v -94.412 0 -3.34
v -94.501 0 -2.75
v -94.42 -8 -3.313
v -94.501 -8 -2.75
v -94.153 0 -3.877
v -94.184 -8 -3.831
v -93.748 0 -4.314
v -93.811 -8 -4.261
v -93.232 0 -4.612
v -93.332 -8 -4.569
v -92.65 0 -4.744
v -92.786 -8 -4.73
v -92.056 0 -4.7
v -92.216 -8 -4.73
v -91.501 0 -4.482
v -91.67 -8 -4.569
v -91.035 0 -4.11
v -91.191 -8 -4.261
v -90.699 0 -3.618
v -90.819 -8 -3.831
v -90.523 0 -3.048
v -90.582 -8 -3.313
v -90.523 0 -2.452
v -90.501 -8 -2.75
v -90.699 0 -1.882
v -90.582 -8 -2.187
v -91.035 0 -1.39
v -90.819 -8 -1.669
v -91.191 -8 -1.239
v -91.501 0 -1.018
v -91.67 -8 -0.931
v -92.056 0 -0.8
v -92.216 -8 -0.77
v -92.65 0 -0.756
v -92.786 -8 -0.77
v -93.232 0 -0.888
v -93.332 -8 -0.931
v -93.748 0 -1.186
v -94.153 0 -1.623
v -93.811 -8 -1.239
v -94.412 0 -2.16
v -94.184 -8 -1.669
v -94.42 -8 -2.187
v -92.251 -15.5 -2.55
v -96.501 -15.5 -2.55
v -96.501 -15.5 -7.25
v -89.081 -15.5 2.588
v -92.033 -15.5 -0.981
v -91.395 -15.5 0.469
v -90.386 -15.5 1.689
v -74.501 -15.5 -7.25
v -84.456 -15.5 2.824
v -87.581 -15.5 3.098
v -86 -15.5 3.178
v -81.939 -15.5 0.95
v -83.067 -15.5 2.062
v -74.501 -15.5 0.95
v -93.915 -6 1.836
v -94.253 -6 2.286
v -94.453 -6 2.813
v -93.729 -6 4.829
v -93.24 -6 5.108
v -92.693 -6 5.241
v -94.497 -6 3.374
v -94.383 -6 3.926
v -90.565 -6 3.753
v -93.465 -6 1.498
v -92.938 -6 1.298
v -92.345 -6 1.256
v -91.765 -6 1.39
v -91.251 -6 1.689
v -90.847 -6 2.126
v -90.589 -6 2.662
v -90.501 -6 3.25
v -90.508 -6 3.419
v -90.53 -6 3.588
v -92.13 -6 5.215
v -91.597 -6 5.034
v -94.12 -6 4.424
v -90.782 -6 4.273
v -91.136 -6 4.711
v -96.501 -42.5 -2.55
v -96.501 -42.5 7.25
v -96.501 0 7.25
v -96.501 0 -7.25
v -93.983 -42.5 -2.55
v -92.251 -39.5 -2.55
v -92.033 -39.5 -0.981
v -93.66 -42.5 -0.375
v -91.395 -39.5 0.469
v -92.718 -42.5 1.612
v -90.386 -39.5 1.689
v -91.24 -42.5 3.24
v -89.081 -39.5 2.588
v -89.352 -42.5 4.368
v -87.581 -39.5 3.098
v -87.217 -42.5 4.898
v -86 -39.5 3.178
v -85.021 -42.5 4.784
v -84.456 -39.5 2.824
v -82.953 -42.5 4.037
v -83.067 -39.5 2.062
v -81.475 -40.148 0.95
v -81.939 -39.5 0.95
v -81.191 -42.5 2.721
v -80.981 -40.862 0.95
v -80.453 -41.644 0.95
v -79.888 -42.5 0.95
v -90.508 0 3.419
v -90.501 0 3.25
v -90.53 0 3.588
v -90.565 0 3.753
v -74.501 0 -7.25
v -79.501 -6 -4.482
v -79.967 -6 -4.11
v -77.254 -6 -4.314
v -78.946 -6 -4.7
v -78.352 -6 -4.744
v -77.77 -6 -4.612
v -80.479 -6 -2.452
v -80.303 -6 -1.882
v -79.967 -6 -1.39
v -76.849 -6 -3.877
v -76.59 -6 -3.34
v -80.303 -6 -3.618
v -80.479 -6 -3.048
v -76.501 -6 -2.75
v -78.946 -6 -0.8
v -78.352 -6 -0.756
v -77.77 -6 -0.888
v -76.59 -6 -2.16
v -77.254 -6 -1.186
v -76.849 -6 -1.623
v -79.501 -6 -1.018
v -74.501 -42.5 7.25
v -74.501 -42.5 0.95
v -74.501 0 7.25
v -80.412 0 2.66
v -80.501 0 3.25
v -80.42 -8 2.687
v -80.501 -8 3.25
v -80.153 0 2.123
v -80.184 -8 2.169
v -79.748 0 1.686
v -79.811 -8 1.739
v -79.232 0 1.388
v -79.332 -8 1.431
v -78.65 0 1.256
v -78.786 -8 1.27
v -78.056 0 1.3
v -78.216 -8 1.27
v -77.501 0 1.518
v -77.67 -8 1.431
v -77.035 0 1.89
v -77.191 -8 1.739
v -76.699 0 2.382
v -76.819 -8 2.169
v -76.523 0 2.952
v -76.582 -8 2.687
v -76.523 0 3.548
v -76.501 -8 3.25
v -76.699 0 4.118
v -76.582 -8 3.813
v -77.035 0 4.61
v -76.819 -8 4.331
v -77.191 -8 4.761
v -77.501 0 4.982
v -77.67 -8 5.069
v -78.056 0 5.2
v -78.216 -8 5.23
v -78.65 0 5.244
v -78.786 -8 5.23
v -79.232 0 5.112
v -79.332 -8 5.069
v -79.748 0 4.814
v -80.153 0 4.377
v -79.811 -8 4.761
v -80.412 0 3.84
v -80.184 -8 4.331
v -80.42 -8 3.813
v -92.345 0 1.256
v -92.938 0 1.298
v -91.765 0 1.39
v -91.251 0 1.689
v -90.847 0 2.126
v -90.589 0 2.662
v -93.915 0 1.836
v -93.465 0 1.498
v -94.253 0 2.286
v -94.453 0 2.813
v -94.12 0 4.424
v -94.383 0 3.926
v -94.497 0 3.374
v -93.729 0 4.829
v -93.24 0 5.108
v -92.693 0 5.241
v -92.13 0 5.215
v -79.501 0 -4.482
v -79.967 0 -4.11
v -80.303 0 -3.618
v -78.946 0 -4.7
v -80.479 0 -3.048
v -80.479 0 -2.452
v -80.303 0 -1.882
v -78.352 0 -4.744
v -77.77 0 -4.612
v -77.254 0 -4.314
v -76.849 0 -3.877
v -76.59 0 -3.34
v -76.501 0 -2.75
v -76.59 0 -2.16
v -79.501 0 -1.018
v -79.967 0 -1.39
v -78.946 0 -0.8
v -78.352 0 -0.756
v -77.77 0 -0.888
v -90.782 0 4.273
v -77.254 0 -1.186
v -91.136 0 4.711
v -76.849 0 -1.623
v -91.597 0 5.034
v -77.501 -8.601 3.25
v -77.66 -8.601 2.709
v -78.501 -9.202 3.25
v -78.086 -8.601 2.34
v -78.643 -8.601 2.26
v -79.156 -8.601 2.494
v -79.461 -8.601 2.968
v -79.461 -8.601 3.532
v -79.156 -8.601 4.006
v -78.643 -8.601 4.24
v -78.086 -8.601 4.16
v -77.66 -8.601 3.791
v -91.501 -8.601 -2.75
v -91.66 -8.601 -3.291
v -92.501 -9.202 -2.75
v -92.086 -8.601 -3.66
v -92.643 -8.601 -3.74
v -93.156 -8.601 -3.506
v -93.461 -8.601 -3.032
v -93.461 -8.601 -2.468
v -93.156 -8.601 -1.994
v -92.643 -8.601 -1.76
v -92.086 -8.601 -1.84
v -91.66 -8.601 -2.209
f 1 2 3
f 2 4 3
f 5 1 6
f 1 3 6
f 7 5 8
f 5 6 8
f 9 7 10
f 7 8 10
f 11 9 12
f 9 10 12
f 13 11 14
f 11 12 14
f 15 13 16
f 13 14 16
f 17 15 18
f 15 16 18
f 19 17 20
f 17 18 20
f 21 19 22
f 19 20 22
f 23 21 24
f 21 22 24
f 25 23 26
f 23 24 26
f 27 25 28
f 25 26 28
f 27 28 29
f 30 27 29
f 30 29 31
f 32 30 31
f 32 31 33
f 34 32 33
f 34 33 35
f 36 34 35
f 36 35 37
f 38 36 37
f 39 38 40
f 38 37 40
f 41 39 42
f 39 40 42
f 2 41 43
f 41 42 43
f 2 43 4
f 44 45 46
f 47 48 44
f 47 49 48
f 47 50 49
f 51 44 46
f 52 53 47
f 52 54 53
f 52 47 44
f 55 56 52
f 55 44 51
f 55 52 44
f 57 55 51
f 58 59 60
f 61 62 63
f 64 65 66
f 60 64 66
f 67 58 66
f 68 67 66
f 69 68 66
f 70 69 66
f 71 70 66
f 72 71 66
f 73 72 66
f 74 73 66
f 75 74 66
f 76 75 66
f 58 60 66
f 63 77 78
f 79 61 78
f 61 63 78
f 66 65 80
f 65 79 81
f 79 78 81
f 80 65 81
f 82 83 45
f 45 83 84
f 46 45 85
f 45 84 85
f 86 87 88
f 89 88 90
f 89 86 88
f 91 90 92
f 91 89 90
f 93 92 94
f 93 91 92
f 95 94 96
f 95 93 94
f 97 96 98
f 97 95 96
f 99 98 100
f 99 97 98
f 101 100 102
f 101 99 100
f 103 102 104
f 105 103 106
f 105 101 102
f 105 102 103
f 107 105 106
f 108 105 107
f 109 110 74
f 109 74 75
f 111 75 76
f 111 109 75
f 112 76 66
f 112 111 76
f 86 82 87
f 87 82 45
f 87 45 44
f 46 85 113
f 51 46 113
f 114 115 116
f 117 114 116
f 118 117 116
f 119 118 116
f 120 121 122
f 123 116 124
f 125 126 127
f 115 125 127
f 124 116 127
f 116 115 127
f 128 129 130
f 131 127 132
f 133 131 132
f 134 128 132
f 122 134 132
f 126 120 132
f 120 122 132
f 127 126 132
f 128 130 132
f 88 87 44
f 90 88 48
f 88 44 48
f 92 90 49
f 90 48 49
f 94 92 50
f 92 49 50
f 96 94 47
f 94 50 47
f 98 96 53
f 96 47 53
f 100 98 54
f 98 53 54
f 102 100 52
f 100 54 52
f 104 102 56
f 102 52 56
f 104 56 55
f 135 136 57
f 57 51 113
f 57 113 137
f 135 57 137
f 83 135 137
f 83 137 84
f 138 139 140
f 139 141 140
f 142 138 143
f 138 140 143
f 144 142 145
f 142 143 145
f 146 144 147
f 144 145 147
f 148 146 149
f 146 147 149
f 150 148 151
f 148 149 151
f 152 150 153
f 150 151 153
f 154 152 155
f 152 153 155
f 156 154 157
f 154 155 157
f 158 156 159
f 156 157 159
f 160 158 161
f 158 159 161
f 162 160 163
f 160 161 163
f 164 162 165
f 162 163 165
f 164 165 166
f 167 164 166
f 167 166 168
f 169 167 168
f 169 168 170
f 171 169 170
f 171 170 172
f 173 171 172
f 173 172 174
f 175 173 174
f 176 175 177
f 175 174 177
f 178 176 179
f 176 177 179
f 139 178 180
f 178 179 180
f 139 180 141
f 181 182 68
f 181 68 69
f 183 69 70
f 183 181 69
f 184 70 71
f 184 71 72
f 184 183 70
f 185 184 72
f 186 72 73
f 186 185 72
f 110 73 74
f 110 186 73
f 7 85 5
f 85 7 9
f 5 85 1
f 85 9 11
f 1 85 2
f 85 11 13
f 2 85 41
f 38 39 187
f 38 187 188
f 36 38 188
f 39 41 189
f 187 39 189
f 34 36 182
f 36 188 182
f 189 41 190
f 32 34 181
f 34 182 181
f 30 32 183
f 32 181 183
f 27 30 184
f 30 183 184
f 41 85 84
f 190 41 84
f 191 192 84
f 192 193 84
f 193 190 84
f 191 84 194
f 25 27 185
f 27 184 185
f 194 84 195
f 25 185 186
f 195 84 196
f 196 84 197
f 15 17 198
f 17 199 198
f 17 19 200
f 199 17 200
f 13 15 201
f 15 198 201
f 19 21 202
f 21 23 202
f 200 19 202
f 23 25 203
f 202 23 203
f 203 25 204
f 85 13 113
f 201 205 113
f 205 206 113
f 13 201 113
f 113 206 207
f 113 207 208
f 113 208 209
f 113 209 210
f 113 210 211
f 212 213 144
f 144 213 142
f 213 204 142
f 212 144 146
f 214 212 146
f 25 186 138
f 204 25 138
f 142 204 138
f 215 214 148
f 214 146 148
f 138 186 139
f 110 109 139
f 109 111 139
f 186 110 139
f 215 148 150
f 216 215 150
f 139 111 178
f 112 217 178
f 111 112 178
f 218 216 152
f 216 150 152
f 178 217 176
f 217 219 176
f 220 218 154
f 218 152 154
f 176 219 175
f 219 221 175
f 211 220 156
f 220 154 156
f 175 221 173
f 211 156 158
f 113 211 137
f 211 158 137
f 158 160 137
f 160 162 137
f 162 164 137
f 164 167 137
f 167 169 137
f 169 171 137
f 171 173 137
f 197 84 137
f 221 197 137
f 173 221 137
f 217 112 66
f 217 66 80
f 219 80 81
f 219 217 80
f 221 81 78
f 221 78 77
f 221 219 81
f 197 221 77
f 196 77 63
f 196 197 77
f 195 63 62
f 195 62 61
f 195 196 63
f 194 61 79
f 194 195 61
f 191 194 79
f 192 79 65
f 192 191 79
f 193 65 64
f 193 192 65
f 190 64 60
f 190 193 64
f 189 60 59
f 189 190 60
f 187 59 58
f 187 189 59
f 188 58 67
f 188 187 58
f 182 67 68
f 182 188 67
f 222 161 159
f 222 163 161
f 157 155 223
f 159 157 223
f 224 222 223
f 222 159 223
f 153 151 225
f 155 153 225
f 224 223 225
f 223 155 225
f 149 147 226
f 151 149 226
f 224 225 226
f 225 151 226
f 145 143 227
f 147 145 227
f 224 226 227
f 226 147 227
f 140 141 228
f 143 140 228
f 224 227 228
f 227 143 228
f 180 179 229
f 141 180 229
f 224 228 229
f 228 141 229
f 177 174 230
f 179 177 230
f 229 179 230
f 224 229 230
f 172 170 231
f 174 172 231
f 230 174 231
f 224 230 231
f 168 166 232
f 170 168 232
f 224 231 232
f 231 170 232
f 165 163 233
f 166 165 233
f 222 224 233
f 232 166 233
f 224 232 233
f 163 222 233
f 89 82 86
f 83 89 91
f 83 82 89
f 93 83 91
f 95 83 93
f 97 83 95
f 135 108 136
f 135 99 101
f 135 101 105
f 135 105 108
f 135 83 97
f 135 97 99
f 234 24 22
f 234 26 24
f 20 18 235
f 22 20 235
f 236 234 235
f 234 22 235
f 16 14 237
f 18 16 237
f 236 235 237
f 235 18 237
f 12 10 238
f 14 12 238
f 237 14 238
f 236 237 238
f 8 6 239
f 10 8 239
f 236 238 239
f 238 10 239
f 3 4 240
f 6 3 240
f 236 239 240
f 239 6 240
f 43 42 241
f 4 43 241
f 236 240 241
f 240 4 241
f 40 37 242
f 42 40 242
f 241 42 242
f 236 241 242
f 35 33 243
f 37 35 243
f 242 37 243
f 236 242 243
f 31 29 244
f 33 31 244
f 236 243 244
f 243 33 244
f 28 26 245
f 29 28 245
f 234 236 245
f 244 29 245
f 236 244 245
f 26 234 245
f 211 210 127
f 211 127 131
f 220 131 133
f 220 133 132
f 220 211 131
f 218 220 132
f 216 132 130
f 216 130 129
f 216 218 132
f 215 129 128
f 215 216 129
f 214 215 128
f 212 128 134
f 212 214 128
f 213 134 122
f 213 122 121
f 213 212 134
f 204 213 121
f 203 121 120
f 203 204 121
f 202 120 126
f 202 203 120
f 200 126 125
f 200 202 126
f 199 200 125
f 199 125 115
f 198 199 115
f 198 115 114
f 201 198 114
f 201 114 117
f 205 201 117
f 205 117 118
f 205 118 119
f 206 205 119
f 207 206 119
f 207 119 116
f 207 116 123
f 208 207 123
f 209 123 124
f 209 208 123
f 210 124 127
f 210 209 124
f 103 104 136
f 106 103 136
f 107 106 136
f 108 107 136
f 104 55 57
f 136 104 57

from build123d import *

# Parameters (mm, degrees)
F0_R     = 1.62
F0_R_2   = 2
F1_DEPTH = 15.5
F3_DEPTH = 27
F4_D     = 4
F4_DEPTH = 8
F4_TIP   = 1.2017212381
F5_DEPTH = 6
F6_SIZE2 = 1.7320508076
F6_SIZE  = 3


# Not quite as in the source:
# - ends of sketch curves that miss each other by under 0.0002 mm in the source are joined


with BuildPart() as f1:
    # F0 (on Front) → F1 (new body)
    with BuildSketch(Plane.XZ):
        with BuildLine():
            Line((-81.938941, 0.95), (-79.867763328, 0.95))
            ThreePointArc((-79.867763328, 0.95), (-84.599863166, 4.7050416476), (-90.5653650686, 3.7532564808))
            ThreePointArc((-90.5653650686, 3.7532564808), (-90.517166249, 3.503677095), (-90.501013, 3.25))
            ThreePointArc((-90.501013, 3.25), (-91.2509614327, 1.6887917887), (-92.9383840791, 1.2984092286))
            ThreePointArc((-92.9383840791, 1.2984092286), (-93.5417590804, 0.0341622689), (-93.899505073, -1.3202378094))
            ThreePointArc((-93.899505073, -1.3202378094), (-93.0082544766, -0.8153925244), (-91.9839548989, -0.8179930331))
            ThreePointArc((-91.9839548989, -0.8179930331), (-87.4977327048, 3.112954161), (-81.938941, 0.95))
        make_face()
        with BuildLine():
            ThreePointArc((-90.5653650686, 3.7532564808), (-84.599863166, 4.7050416476), (-79.867763328, 0.9499998269))
            Line((-79.867763328, 0.9499998269), (-74.501013, 0.95))
            Line((-74.501013, 0.95), (-74.501013, 7.25))
            Line((-74.501013, 7.25), (-96.501013, 7.25))
            Line((-96.501013, 7.25), (-96.501013, -2.55))
            Line((-96.501013, -2.55), (-94.4909878742, -2.55))
            ThreePointArc((-94.4909878742, -2.55), (-94.3033741804, -1.8831123628), (-93.899505073, -1.3202378094))
            ThreePointArc((-93.899505073, -1.3202378094), (-93.5417590804, 0.0341622689), (-92.9383840791, 1.2984092286))
            ThreePointArc((-92.9383840791, 1.2984092286), (-93.9389897521, 4.6400441937), (-90.5653650686, 3.7532564808))
        make_face()
        with Locations((-78.501013, 3.25)):
            Circle(F0_R, mode=Mode.SUBTRACT)
        with BuildLine():
            Line((-74.501013, 0.95), (-79.867763328, 0.95))
            Line((-79.867763328, 0.95), (-81.938941, 0.95))
            ThreePointArc((-81.9389410644, 0.9499999506), (-87.4977327048, 3.112954161), (-91.9839548989, -0.8179930331))
            ThreePointArc((-91.9839548989, -0.8179930331), (-92.0381964068, -1.0001290636), (-92.086389397, -1.1839580887))
            ThreePointArc((-92.086389397, -1.1839580887), (-91.2172509043, -1.7618932843), (-90.881013, -2.75))
            ThreePointArc((-90.881013, -2.75), (-92.6012048017, -4.3668987609), (-94.1086199171, -2.55))
            Line((-94.1086199171, -2.55), (-94.4909878742, -2.55))
            Line((-94.4909878742, -2.55), (-96.501013, -2.55))
            Line((-96.501013, -2.55), (-96.501013, -7.25))
            Line((-96.501013, -7.25), (-74.501013, -7.25))
            Line((-74.501013, -7.25), (-74.501013, 0.95))
        make_face()
        with Locations((-78.501013, -2.75)):
            Circle(F0_R_2, mode=Mode.SUBTRACT)
        with BuildLine():
            ThreePointArc((-92.9383840791, 1.2984092286), (-91.8934258204, 2.6626657264), (-90.5653650686, 3.7532564808))
            ThreePointArc((-90.5653650686, 3.7532564808), (-93.9389897521, 4.6400441937), (-92.9383840791, 1.2984092286))
        make_face()
        with Locations((-78.501013, -2.75)):
            Circle(F0_R_2)
        with BuildLine():
            ThreePointArc((-90.501013, 3.25), (-90.517166249, 3.503677095), (-90.5653650686, 3.7532564808))
            ThreePointArc((-90.5653650686, 3.7532564808), (-91.8934258204, 2.6626657264), (-92.9383840791, 1.2984092286))
            ThreePointArc((-92.9383840791, 1.2984092286), (-91.2509614327, 1.6887917887), (-90.501013, 3.25))
        make_face()
        with Locations((-78.501013, 3.25)):
            Circle(F0_R)
        with BuildLine():
            ThreePointArc((-93.9879149105, -2.1069426863), (-93.9540972375, -1.7124229299), (-93.899505073, -1.3202378094))
            ThreePointArc((-93.899505073, -1.3202378094), (-94.3033741804, -1.8831123628), (-94.4909878742, -2.55))
            Line((-94.4909878742, -2.55), (-94.1086199171, -2.55))
            ThreePointArc((-94.1086199171, -2.55), (-94.0640456826, -2.324172766), (-93.9879149105, -2.1069426863))
        make_face()
        with BuildLine():
            ThreePointArc((-92.086389397, -1.1839580887), (-92.0381964068, -1.0001290636), (-91.9839548989, -0.8179930331))
            ThreePointArc((-91.9839548989, -0.8179930331), (-93.0082544766, -0.8153925244), (-93.899505073, -1.3202378094))
            ThreePointArc((-93.899505073, -1.3202378094), (-93.9540972375, -1.7124229299), (-93.9879149105, -2.1069426863))
            ThreePointArc((-93.9879149105, -2.1069426863), (-93.2084169398, -1.29261204), (-92.086389397, -1.1839580887))
        make_face()
        with BuildLine():
            ThreePointArc((-90.881013, -2.75), (-91.2172509043, -1.7618932843), (-92.086389397, -1.1839580887))
            ThreePointArc((-92.086389397, -1.1839580887), (-92.2097087478, -1.8620371678), (-92.251013, -2.55))
            Line((-92.251013, -2.55), (-94.001013, -2.55))
            Line((-94.001013, -2.55), (-94.1086199171, -2.55))
            ThreePointArc((-94.1086199171, -2.55), (-92.6012048017, -4.3668987609), (-90.881013, -2.75))
        make_face()
        with BuildLine():
            ThreePointArc((-92.251013, -2.55), (-92.2097087478, -1.8620371678), (-92.086389397, -1.1839580887))
            ThreePointArc((-92.086389397, -1.1839580887), (-93.2084169398, -1.29261204), (-93.9879149105, -2.1069426863))
            ThreePointArc((-93.9879149105, -2.1069426863), (-93.9977377625, -2.3283745597), (-94.001013, -2.55))
            Line((-94.001013, -2.55), (-92.251013, -2.55))
        make_face()
        with BuildLine():
            ThreePointArc((-94.001013, -2.55), (-93.9977377625, -2.3283745597), (-93.9879149105, -2.1069426863))
            ThreePointArc((-93.9879149105, -2.1069426863), (-94.0640456826, -2.324172766), (-94.1086199171, -2.55))
            Line((-94.1086199171, -2.55), (-94.001013, -2.55))
        make_face()
    extrude(amount=F1_DEPTH)

    # F2 (on face) → F3 (join)
    with BuildSketch(Plane.XZ.offset(15.5)):
        with BuildLine():
            Line((-81.938941, 0.95), (-74.501013, 0.95))
            Line((-74.501013, 0.95), (-74.501013, 7.25))
            Line((-74.501013, 7.25), (-96.501013, 7.25))
            Line((-96.501013, 7.25), (-96.501013, -2.55))
            Line((-96.501013, -2.55), (-92.251013, -2.55))
            ThreePointArc((-92.251013, -2.55), (-88.3490641857, 2.8949248677), (-81.9389410644, 0.9499999506))
        make_face()
    extrude(amount=F3_DEPTH)

    # F4
    with Locations(Plane(origin=(0, 0, 0), x_dir=(1, 0, 0), z_dir=(0, 1, 0))):
        with Locations((-92.501013, 2.75), (-78.501013, -3.25)):
            Hole(F4_D / 2, depth=F4_DEPTH)
            with Locations((0, 0, -(F4_DEPTH + F4_TIP / 2))):  # 118° drill point
                Cone(0, F4_D / 2, F4_TIP, mode=Mode.SUBTRACT)

    # F0 (on Front) → F5 (cut)
    with BuildSketch(Plane.XZ):
        with BuildLine():
            ThreePointArc((-92.9383840791, 1.2984092286), (-91.8934258204, 2.6626657264), (-90.5653650686, 3.7532564808))
            ThreePointArc((-90.5653650686, 3.7532564808), (-93.9389897521, 4.6400441937), (-92.9383840791, 1.2984092286))
        make_face()
        with BuildLine():
            ThreePointArc((-90.501013, 3.25), (-90.517166249, 3.503677095), (-90.5653650686, 3.7532564808))
            ThreePointArc((-90.5653650686, 3.7532564808), (-91.8934258204, 2.6626657264), (-92.9383840791, 1.2984092286))
            ThreePointArc((-92.9383840791, 1.2984092286), (-91.2509614327, 1.6887917887), (-90.501013, 3.25))
        make_face()
        with Locations((-78.501013, -2.75)):
            Circle(F0_R_2)
    extrude(amount=F5_DEPTH, mode=Mode.SUBTRACT)

    # F6
    f6_edges = [f1.edges().sort_by_distance(p)[0] for p in [
        (-88.349064, -42.5, 2.894925),
    ]]
    f6_side = f1.faces().sort_by_distance((-88.349064, -29, 2.894925))[0]
    chamfer(f6_edges, length=F6_SIZE, length2=F6_SIZE2, reference=f6_side)


solid = f1.part
